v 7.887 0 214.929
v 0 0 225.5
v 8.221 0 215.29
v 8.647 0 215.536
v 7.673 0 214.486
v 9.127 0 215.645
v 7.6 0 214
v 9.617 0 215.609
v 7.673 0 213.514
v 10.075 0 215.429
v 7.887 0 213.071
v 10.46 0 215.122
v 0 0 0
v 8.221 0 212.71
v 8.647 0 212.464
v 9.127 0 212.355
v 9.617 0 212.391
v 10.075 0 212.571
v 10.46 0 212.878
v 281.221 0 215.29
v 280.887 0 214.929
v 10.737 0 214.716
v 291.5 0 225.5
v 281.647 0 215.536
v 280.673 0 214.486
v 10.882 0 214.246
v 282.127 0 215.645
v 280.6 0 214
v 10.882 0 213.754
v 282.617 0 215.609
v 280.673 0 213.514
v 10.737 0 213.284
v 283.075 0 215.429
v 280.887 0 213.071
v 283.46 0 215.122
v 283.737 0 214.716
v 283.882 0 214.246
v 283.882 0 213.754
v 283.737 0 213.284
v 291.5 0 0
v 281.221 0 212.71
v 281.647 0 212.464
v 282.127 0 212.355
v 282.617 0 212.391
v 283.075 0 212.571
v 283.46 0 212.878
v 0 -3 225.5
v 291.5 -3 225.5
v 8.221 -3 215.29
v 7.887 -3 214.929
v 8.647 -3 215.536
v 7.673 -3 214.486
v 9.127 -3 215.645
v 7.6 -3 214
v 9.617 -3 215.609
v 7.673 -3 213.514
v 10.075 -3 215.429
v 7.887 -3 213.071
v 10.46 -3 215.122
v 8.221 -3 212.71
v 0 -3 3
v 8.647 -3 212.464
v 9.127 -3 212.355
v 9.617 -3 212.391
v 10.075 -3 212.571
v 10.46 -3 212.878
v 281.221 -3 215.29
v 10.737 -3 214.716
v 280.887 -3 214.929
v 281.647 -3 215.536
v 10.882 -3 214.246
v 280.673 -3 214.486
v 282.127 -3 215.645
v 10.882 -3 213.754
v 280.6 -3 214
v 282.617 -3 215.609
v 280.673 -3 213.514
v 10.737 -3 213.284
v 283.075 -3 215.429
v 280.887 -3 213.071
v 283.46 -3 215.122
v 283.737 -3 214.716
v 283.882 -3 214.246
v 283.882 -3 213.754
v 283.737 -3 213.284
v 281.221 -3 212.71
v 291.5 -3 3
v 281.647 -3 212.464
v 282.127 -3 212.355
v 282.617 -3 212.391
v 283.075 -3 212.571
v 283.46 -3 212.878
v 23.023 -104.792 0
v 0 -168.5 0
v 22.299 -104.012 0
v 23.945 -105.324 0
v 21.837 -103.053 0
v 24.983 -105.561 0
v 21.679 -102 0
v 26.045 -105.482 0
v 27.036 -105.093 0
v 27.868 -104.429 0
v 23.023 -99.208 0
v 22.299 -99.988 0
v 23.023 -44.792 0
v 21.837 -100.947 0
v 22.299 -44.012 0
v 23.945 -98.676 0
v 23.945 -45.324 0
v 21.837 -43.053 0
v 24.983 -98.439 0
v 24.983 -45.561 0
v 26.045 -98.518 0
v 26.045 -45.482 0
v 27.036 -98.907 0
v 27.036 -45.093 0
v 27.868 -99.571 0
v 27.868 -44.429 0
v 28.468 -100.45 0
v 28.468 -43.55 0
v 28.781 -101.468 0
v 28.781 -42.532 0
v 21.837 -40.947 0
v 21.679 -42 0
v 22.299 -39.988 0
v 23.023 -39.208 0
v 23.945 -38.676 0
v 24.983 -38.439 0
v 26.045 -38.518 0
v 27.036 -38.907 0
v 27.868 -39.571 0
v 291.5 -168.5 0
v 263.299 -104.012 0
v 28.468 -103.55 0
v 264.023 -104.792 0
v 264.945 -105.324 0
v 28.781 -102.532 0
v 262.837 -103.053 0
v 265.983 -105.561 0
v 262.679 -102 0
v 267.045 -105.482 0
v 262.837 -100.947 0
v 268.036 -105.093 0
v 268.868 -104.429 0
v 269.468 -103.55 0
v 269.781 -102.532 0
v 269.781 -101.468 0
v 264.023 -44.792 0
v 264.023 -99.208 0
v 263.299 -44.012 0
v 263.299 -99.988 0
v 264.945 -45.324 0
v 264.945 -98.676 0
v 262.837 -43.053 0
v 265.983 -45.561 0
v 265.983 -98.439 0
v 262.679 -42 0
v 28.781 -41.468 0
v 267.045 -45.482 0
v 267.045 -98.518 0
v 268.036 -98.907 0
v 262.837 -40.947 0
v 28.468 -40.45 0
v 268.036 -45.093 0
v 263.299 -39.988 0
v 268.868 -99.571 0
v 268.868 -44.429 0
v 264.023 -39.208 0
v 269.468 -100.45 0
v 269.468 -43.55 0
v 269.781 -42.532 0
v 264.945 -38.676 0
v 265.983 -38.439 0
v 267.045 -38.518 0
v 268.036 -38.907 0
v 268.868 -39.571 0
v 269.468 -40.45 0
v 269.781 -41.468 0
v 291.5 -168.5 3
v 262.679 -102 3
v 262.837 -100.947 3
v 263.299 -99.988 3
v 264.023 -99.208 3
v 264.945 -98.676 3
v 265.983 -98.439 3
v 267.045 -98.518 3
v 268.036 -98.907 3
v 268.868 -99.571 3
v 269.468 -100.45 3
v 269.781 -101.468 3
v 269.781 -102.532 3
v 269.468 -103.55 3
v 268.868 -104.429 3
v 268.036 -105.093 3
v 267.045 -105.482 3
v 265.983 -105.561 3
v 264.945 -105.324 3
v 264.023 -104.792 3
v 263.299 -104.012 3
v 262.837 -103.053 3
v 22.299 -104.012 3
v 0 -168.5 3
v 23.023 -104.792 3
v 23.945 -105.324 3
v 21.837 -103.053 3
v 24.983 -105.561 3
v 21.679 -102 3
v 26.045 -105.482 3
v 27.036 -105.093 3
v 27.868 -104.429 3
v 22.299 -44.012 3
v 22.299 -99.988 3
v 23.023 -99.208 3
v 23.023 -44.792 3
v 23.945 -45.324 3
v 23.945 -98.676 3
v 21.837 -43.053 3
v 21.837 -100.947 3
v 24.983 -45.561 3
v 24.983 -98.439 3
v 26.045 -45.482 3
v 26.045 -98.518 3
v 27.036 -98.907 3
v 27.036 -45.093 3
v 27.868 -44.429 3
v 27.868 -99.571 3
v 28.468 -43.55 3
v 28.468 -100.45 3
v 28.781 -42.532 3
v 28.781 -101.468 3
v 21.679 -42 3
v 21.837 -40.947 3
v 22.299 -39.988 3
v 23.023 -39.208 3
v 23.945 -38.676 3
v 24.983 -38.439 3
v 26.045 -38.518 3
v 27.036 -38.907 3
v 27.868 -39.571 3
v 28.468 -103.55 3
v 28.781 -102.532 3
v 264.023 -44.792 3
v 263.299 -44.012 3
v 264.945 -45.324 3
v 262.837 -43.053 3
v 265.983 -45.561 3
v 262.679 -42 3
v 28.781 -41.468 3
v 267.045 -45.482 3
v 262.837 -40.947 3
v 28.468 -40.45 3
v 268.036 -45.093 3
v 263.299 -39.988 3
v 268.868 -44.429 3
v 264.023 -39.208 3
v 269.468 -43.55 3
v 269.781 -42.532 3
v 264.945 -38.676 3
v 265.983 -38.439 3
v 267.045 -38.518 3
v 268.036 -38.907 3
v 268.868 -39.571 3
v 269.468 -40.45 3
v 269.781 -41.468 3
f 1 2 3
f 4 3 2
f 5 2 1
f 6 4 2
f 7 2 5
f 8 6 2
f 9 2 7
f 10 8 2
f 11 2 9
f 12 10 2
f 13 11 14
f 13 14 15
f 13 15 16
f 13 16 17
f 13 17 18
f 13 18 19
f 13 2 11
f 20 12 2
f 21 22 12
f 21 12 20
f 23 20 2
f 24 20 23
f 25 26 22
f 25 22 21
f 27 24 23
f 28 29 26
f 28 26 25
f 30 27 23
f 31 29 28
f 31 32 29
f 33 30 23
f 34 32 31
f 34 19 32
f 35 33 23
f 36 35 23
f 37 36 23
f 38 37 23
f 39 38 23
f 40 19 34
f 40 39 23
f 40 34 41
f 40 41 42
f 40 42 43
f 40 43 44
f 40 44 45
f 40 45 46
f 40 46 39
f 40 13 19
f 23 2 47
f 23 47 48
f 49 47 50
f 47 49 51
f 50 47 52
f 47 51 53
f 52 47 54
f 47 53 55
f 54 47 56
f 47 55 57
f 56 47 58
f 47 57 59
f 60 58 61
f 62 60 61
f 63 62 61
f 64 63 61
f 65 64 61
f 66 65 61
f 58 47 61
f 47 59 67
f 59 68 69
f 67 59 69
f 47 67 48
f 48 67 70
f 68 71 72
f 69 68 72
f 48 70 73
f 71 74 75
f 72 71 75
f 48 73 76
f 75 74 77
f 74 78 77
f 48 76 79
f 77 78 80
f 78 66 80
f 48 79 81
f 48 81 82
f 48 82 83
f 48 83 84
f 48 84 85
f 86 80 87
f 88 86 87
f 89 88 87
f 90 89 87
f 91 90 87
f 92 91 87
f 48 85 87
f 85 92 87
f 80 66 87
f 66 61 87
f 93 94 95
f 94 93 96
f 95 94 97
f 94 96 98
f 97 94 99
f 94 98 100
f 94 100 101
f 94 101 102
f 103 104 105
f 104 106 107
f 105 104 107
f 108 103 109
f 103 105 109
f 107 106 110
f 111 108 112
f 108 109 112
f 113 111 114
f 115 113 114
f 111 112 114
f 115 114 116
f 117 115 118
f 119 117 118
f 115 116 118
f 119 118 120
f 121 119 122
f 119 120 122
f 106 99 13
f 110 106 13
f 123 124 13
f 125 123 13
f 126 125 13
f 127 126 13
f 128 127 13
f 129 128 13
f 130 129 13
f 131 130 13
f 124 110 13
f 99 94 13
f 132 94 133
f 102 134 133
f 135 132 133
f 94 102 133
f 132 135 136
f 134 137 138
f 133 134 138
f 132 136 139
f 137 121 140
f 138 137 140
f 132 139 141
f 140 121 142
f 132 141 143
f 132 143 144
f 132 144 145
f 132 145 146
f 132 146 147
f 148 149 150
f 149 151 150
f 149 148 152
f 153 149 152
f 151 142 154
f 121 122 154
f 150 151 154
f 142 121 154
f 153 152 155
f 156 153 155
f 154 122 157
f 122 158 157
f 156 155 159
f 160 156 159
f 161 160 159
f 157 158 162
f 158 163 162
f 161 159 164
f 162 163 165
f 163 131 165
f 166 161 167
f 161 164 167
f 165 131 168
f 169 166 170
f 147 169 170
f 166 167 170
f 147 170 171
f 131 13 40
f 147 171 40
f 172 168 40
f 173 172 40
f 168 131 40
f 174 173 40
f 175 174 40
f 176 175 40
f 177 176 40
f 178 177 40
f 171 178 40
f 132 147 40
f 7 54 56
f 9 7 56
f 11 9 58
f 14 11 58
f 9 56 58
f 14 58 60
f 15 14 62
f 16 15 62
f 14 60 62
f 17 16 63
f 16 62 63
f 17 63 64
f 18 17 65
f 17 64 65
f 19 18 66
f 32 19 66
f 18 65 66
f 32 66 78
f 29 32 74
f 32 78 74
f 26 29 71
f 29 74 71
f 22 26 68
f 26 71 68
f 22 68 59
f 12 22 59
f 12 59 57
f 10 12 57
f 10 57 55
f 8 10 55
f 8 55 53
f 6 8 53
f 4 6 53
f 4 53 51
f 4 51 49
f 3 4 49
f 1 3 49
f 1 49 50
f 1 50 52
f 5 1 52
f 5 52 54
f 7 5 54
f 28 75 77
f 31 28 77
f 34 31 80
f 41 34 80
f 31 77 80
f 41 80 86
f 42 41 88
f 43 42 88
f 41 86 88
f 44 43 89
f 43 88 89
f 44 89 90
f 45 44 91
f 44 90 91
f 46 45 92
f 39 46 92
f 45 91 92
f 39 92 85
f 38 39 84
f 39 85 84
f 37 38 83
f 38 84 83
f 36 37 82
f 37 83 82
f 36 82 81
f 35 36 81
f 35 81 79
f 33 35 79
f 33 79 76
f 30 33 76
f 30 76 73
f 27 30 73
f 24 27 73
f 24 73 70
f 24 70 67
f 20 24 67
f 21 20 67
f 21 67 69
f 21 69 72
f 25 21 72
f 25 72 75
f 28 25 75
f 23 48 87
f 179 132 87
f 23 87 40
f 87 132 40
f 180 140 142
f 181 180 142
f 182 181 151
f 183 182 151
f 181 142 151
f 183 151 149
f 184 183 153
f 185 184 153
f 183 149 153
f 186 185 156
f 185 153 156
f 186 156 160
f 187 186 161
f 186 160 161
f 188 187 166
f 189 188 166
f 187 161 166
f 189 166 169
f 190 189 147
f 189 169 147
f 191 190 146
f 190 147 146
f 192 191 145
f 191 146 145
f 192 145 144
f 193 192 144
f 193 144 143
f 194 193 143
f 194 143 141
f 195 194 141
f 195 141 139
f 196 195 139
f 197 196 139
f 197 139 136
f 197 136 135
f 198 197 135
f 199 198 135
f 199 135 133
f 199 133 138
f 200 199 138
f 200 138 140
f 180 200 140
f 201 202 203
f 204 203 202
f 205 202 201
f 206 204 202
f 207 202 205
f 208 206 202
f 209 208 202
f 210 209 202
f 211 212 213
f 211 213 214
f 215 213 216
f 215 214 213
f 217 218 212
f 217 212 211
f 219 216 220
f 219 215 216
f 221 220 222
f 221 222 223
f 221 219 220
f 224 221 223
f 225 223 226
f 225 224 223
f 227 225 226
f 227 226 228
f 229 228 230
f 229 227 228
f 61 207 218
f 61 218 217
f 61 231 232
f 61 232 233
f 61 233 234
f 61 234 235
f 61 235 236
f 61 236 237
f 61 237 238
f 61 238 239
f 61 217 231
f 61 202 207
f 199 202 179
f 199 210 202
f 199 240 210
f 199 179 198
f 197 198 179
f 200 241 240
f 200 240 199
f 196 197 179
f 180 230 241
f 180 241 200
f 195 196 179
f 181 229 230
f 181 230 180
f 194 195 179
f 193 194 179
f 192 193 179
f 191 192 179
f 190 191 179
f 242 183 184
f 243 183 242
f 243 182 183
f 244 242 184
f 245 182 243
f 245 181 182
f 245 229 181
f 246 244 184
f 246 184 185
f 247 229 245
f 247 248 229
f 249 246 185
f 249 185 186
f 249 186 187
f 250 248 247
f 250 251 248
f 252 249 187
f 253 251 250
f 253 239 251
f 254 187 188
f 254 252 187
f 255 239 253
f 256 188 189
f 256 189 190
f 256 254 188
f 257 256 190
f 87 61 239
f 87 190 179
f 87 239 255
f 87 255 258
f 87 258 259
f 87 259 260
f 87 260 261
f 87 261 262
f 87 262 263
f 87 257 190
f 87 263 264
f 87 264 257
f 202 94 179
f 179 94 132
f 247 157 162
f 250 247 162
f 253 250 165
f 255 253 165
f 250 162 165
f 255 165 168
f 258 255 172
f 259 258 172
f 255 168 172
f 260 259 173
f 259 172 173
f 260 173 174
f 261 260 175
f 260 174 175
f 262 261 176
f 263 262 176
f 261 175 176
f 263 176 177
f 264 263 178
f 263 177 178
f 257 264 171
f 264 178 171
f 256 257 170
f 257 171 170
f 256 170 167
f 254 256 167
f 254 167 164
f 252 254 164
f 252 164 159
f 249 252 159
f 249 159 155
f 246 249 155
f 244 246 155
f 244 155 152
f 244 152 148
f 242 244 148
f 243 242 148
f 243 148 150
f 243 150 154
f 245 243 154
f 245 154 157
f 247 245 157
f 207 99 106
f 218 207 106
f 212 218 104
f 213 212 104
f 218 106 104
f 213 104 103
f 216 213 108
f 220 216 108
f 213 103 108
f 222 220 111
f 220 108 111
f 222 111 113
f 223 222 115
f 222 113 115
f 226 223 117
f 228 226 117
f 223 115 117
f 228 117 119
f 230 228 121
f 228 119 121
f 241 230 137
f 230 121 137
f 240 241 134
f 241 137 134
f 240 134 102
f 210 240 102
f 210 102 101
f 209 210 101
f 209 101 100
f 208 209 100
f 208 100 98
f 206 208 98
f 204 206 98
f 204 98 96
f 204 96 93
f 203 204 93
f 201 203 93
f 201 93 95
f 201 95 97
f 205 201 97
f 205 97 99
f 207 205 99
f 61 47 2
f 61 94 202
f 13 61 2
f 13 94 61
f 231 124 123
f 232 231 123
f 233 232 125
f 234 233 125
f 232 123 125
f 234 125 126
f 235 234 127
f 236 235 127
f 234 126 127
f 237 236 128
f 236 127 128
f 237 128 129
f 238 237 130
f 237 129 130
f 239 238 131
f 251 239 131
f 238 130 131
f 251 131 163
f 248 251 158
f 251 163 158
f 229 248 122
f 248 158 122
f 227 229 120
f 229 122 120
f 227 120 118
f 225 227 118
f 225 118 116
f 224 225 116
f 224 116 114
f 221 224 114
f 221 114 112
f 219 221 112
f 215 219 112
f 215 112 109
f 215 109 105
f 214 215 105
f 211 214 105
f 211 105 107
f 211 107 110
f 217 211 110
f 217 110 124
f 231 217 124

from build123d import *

# Parameters (mm, degrees)
SKETCH1_W               = 291.5
SKETCH1_H               = 168.5
BOSS_EXTRUDE1_DEPTH     = 3
F_1_4_CLEARANCE_HOLE1_D = 7.14248
SKETCH6_W               = 291.5
SKETCH6_H               = 3
BOSS_EXTRUDE2_DEPTH     = 222.5
TAP_DRILL_FOR_M4_TAP2_D = 3.3


with BuildPart() as part:
    # Sketch1 → Boss-Extrude1 (new body)
    with BuildSketch(Plane.XY):
        with Locations((145.75, -84.25)):
            Rectangle(SKETCH1_W, SKETCH1_H)
    extrude(amount=BOSS_EXTRUDE1_DEPTH)

    # 1/4 Clearance Hole1 (through all)
    with Locations(Plane.XY.offset(3)):
        with Locations((25.25, -102), (25.25, -42), (266.25, -42), (266.25, -102)):
            Hole(F_1_4_CLEARANCE_HOLE1_D / 2)

    # Sketch6 → Boss-Extrude2 (add)
    with BuildSketch(Plane.XY.offset(3)):
        with Locations((145.75, -1.5)):
            Rectangle(SKETCH6_W, SKETCH6_H)
    extrude(amount=BOSS_EXTRUDE2_DEPTH)

    # Tap Drill for M4 Tap2 (through all)
    with Locations(Plane(origin=(0, 0, 0), x_dir=(1, 0, 0), z_dir=(0, 1, 0))):
        with Locations((9.25, -214), (282.25, -214)):
            Hole(TAP_DRILL_FOR_M4_TAP2_D / 2)


solid = part.part
